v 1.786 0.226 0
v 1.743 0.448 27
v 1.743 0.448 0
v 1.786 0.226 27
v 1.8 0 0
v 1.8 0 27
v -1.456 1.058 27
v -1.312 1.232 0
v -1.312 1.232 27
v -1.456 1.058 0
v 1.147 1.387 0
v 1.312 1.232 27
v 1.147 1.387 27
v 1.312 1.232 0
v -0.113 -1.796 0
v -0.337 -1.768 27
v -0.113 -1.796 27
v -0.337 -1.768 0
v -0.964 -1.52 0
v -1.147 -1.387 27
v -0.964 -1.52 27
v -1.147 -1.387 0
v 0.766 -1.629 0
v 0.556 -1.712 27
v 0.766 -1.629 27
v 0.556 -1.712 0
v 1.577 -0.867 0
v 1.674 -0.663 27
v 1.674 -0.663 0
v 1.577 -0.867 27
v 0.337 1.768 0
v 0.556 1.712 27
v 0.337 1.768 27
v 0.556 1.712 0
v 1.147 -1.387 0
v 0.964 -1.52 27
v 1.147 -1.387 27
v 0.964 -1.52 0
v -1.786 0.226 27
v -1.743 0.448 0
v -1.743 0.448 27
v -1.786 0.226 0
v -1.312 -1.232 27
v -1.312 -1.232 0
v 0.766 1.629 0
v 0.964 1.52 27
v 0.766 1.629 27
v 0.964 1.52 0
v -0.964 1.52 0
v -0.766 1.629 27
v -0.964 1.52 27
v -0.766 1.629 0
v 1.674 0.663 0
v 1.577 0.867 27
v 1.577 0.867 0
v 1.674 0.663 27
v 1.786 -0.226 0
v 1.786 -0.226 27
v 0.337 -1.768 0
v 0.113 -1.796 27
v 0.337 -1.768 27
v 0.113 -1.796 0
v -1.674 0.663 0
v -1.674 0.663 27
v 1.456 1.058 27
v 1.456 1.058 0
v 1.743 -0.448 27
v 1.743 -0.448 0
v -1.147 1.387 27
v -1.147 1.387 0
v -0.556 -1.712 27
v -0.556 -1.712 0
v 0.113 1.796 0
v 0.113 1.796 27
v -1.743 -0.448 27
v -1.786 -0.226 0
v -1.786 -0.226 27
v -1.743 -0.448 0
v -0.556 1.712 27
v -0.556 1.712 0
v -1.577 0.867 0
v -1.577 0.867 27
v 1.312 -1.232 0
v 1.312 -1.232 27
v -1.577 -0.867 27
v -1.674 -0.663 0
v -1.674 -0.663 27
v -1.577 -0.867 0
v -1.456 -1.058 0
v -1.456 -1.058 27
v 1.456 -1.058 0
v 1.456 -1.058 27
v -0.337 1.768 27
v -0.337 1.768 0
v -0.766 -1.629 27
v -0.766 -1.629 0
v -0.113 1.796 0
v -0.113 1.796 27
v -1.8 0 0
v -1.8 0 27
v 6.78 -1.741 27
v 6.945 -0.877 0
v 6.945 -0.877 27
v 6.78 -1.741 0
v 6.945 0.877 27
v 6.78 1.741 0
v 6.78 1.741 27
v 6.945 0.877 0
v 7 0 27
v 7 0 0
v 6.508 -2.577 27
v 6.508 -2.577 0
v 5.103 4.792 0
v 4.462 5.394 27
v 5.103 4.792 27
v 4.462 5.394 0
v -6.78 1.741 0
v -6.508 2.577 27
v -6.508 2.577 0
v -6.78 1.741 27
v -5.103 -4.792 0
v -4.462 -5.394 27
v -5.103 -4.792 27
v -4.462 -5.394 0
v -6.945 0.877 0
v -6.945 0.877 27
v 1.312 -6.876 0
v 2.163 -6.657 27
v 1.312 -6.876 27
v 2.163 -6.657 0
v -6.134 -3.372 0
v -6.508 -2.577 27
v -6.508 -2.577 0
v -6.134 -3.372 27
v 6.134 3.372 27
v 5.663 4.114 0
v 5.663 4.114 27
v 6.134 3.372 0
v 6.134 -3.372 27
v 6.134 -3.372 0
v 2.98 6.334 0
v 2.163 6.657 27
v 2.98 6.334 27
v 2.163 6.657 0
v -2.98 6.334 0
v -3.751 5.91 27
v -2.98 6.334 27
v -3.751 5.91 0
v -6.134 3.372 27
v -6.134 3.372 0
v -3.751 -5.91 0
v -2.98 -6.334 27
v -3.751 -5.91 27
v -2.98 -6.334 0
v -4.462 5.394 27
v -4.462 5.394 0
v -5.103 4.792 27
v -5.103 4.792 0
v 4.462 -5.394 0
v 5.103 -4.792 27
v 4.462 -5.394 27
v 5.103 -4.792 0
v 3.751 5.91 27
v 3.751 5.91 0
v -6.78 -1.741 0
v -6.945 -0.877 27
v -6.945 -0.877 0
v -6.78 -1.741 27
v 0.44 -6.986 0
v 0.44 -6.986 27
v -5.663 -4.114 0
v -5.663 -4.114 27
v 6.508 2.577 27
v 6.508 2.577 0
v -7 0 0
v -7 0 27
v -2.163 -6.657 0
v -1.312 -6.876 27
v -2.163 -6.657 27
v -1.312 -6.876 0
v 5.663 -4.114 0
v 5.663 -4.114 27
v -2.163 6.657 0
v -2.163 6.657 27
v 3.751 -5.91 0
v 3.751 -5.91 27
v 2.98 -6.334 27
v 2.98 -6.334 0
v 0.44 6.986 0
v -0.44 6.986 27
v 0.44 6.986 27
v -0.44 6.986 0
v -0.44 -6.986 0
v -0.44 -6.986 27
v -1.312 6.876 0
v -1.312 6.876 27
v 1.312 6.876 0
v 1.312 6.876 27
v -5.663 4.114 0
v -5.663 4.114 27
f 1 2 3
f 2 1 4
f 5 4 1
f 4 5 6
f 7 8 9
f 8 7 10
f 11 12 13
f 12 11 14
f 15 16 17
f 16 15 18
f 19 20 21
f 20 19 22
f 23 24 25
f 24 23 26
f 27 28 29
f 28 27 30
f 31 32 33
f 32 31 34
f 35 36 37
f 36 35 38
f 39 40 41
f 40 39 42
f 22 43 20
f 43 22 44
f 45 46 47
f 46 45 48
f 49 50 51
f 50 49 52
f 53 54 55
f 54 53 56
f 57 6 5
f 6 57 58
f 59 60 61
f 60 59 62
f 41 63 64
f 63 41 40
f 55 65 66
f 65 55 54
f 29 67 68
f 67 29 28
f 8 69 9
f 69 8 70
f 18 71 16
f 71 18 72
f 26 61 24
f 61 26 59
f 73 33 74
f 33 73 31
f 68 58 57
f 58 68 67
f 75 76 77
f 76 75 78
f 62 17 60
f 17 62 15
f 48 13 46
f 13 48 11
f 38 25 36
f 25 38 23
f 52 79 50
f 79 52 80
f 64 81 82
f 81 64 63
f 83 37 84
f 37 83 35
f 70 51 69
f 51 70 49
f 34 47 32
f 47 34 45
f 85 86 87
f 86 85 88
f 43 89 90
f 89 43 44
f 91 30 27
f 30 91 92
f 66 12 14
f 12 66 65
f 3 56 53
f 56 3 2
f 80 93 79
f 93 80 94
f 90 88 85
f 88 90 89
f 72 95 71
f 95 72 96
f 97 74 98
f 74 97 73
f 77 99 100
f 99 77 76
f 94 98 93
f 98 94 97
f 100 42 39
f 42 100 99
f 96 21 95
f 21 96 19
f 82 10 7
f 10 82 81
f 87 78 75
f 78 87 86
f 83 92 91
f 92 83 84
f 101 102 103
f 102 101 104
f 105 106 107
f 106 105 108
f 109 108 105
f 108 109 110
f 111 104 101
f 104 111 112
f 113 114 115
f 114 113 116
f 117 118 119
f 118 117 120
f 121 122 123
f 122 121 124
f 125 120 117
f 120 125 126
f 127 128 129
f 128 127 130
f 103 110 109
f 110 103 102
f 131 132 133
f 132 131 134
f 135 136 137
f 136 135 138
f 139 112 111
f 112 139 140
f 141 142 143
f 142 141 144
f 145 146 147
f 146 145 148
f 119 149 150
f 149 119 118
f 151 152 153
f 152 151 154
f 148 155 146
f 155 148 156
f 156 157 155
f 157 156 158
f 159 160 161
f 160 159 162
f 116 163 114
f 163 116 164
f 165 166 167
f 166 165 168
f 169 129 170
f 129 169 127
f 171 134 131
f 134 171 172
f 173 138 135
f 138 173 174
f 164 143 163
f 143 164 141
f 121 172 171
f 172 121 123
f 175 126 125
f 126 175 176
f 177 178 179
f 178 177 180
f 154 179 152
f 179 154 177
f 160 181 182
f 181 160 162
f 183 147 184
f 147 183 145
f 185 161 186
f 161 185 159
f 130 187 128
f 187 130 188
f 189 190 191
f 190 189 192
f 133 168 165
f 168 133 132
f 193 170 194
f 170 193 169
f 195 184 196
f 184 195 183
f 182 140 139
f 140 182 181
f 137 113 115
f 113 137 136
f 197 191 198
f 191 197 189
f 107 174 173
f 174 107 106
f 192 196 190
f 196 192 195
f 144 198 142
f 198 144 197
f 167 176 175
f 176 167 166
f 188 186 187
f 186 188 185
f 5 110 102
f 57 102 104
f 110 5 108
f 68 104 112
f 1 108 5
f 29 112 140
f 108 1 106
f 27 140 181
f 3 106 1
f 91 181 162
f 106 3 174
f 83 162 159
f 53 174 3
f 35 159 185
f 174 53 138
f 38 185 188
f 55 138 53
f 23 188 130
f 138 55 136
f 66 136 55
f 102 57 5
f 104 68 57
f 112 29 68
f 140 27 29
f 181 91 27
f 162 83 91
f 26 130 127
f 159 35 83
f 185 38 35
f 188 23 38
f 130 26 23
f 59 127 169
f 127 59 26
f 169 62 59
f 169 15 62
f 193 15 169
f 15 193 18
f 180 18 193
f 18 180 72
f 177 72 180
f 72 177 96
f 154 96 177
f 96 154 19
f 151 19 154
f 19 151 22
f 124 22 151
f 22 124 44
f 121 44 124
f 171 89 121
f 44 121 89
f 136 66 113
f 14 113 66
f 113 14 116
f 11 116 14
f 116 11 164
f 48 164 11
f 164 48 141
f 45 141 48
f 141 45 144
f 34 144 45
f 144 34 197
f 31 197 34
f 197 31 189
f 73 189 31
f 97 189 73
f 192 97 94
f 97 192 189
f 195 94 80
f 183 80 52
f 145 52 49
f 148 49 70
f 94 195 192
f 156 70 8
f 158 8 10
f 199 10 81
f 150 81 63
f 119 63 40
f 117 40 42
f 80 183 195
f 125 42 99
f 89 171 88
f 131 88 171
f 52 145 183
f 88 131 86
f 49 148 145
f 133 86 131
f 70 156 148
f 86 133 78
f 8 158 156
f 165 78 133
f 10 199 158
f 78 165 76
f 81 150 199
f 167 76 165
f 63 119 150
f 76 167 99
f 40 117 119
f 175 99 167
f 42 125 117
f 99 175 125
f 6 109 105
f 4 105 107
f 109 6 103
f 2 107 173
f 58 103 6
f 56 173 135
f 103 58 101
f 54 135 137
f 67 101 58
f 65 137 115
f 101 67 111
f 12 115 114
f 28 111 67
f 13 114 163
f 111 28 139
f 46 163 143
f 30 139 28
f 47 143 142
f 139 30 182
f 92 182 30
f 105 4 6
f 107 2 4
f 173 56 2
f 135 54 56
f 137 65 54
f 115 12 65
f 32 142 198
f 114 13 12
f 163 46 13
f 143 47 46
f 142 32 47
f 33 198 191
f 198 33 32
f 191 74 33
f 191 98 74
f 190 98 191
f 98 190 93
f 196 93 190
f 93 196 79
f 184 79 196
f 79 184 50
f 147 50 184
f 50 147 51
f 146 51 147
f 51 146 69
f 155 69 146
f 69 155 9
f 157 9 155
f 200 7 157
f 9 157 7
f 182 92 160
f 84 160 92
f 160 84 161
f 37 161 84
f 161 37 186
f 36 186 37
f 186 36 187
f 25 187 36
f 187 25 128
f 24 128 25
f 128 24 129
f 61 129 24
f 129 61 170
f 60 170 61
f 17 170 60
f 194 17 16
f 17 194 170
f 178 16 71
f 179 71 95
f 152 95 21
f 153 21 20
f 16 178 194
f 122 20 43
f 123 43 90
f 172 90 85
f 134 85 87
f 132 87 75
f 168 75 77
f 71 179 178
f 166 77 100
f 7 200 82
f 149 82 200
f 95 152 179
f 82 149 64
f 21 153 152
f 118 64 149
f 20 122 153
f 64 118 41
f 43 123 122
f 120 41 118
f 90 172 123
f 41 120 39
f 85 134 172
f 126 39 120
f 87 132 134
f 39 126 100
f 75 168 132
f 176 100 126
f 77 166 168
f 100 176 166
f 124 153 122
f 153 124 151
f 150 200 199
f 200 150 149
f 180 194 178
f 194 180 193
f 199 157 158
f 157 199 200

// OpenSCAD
$fn = 50;


difference() {
	union() {
		cylinder(h = 27, r = 7.0000000000);
	}
	union() {
		translate(v = [0.0000000000, 0.0000000000, -100.0000000000]) {
			cylinder(h = 200, r = 1.8000000000);
		}
		cylinder(h = 27, r = 1.8000000000);
		cylinder(h = 27, r = 1.8000000000);
		cylinder(h = 27, r = 1.8000000000);
	}
}
